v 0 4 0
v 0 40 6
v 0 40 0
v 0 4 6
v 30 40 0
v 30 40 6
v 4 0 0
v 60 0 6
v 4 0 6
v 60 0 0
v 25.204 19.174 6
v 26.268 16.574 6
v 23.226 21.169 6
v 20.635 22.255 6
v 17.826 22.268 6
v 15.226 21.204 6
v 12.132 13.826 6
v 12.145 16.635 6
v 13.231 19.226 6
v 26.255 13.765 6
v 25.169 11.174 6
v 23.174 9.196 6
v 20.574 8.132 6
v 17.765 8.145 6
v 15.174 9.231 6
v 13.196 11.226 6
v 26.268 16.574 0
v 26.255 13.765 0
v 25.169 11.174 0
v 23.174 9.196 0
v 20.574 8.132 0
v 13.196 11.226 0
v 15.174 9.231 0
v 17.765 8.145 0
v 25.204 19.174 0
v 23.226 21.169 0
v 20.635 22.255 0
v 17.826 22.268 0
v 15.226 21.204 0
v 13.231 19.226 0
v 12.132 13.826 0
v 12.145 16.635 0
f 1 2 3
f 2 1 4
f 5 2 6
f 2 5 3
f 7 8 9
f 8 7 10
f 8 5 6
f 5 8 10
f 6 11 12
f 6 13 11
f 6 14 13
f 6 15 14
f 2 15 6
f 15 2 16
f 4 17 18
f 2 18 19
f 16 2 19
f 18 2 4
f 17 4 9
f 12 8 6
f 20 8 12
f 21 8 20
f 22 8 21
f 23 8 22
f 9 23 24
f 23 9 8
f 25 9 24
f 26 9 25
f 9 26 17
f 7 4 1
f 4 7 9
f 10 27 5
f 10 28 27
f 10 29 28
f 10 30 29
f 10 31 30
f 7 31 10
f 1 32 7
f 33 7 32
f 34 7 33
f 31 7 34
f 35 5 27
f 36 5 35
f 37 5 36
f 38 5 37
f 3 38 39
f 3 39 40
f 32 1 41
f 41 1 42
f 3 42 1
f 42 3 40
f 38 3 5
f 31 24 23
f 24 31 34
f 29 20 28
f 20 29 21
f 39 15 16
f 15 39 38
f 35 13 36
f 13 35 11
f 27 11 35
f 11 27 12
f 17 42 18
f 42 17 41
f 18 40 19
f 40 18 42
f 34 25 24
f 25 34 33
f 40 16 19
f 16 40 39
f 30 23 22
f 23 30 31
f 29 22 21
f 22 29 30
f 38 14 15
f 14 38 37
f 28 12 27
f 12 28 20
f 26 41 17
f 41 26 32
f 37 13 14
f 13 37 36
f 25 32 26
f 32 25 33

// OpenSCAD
$fn = 32;

// ----------------------------------------------------------------------
// Bracket plate: gusset 60 x 40
// ----------------------------------------------------------------------

// --- parameters (mm) ---
hole_r = 3;               // bolt hole radius
plate_t = 6;              // plate thickness, Z (extrusion height)
gus_a = 60;               // base length
gus_b = 40;               // height
top_x = 30;               // top edge X of the angled cut
light_r = 7.2;            // lightening hole radius

light_d = 2 * light_r;

profile = [[4, 0], [30, 0], [60, 0], [30, 40], [0, 40], [0, 4]];  // primary outline, 6 points, counter clockwise
void_1 = [[26.268, 16.574], [25.204, 19.174], [23.226, 21.169], [20.635, 22.255], [17.826, 22.268], [15.226, 21.204], [13.231, 19.226], [12.145, 16.635], [12.132, 13.826], [13.196, 11.226], [15.174, 9.231], [17.765, 8.145], [20.574, 8.132], [23.174, 9.196], [25.169, 11.174], [26.255, 13.765]];  // lightening hole, 16 points

// --- the one profile operation ---
difference() {
  linear_extrude(height = plate_t) polygon(points = profile);
  translate([0, 0, -1])
    linear_extrude(height = plate_t + 2) polygon(points = void_1);
}
